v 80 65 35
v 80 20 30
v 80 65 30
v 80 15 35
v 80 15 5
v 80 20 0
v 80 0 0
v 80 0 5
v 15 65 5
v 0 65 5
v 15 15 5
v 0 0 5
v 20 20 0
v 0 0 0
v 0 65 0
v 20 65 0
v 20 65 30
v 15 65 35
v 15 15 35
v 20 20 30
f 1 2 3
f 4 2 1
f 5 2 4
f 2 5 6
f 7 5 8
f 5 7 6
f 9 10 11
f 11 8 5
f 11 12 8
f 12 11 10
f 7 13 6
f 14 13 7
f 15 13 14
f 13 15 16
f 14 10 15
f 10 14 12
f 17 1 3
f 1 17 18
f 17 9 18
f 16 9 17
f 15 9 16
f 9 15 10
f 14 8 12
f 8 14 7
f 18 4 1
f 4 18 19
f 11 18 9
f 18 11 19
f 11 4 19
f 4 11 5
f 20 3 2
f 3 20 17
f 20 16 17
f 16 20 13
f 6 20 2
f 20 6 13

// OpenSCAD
height=65;
width=50;
depth=35;

mountBaseWidth=15;
mountBaseHeight=5;

difference() {
    union() {
        cube([height+mountBaseWidth,width+mountBaseWidth,mountBaseHeight]);
        translate([mountBaseWidth,mountBaseWidth,0]) {
            cube([height,width,depth]);
        }
    }
    translate([mountBaseWidth+mountBaseHeight,mountBaseWidth+mountBaseHeight,0]) {
        cube([height-mountBaseHeight,width-mountBaseHeight,depth-mountBaseHeight]);
    }
}
